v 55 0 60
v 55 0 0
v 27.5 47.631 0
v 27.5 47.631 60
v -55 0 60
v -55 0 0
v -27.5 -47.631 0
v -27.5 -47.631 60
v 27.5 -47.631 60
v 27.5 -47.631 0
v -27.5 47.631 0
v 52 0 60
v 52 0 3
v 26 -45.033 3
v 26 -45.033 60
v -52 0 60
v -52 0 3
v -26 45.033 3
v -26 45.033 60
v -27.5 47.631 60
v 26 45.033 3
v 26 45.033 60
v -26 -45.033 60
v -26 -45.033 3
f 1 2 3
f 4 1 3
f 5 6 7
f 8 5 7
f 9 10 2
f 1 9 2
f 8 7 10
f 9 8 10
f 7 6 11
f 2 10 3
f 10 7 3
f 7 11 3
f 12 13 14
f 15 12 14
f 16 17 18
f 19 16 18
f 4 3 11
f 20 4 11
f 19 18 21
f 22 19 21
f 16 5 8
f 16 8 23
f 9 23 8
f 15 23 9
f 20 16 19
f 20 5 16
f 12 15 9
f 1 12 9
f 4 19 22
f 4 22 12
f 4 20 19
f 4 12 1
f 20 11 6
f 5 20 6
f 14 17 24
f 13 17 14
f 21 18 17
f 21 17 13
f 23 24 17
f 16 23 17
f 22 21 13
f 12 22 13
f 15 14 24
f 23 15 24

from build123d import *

# Parameters (mm, degrees)
F1_DEPTH = 60
F2_DEPTH = 3


with BuildPart() as f1:
    # F0 (on Top) → F1 (new body)
    with BuildSketch(Plane.XY):
        Polygon((27.5, -47.631397), (55, 0), (27.5, 47.631397), (-27.5, 47.631397), (-55, 0), (-27.5, -47.631397), align=None)
        Polygon((26, 45.033321), (52, 0), (26, -45.033321), (-26, -45.033321), (-52, 0), (-26, 45.033321), align=None, mode=Mode.SUBTRACT)
    extrude(amount=F1_DEPTH)

    # F0 (on Top) → F2 (join)
    with BuildSketch(Plane.XY):
        Polygon((26, -45.033321), (52, 0), (26, 45.033321), (-26, 45.033321), (-52, 0), (-26, -45.033321), align=None)
    extrude(amount=F2_DEPTH)


solid = f1.part
